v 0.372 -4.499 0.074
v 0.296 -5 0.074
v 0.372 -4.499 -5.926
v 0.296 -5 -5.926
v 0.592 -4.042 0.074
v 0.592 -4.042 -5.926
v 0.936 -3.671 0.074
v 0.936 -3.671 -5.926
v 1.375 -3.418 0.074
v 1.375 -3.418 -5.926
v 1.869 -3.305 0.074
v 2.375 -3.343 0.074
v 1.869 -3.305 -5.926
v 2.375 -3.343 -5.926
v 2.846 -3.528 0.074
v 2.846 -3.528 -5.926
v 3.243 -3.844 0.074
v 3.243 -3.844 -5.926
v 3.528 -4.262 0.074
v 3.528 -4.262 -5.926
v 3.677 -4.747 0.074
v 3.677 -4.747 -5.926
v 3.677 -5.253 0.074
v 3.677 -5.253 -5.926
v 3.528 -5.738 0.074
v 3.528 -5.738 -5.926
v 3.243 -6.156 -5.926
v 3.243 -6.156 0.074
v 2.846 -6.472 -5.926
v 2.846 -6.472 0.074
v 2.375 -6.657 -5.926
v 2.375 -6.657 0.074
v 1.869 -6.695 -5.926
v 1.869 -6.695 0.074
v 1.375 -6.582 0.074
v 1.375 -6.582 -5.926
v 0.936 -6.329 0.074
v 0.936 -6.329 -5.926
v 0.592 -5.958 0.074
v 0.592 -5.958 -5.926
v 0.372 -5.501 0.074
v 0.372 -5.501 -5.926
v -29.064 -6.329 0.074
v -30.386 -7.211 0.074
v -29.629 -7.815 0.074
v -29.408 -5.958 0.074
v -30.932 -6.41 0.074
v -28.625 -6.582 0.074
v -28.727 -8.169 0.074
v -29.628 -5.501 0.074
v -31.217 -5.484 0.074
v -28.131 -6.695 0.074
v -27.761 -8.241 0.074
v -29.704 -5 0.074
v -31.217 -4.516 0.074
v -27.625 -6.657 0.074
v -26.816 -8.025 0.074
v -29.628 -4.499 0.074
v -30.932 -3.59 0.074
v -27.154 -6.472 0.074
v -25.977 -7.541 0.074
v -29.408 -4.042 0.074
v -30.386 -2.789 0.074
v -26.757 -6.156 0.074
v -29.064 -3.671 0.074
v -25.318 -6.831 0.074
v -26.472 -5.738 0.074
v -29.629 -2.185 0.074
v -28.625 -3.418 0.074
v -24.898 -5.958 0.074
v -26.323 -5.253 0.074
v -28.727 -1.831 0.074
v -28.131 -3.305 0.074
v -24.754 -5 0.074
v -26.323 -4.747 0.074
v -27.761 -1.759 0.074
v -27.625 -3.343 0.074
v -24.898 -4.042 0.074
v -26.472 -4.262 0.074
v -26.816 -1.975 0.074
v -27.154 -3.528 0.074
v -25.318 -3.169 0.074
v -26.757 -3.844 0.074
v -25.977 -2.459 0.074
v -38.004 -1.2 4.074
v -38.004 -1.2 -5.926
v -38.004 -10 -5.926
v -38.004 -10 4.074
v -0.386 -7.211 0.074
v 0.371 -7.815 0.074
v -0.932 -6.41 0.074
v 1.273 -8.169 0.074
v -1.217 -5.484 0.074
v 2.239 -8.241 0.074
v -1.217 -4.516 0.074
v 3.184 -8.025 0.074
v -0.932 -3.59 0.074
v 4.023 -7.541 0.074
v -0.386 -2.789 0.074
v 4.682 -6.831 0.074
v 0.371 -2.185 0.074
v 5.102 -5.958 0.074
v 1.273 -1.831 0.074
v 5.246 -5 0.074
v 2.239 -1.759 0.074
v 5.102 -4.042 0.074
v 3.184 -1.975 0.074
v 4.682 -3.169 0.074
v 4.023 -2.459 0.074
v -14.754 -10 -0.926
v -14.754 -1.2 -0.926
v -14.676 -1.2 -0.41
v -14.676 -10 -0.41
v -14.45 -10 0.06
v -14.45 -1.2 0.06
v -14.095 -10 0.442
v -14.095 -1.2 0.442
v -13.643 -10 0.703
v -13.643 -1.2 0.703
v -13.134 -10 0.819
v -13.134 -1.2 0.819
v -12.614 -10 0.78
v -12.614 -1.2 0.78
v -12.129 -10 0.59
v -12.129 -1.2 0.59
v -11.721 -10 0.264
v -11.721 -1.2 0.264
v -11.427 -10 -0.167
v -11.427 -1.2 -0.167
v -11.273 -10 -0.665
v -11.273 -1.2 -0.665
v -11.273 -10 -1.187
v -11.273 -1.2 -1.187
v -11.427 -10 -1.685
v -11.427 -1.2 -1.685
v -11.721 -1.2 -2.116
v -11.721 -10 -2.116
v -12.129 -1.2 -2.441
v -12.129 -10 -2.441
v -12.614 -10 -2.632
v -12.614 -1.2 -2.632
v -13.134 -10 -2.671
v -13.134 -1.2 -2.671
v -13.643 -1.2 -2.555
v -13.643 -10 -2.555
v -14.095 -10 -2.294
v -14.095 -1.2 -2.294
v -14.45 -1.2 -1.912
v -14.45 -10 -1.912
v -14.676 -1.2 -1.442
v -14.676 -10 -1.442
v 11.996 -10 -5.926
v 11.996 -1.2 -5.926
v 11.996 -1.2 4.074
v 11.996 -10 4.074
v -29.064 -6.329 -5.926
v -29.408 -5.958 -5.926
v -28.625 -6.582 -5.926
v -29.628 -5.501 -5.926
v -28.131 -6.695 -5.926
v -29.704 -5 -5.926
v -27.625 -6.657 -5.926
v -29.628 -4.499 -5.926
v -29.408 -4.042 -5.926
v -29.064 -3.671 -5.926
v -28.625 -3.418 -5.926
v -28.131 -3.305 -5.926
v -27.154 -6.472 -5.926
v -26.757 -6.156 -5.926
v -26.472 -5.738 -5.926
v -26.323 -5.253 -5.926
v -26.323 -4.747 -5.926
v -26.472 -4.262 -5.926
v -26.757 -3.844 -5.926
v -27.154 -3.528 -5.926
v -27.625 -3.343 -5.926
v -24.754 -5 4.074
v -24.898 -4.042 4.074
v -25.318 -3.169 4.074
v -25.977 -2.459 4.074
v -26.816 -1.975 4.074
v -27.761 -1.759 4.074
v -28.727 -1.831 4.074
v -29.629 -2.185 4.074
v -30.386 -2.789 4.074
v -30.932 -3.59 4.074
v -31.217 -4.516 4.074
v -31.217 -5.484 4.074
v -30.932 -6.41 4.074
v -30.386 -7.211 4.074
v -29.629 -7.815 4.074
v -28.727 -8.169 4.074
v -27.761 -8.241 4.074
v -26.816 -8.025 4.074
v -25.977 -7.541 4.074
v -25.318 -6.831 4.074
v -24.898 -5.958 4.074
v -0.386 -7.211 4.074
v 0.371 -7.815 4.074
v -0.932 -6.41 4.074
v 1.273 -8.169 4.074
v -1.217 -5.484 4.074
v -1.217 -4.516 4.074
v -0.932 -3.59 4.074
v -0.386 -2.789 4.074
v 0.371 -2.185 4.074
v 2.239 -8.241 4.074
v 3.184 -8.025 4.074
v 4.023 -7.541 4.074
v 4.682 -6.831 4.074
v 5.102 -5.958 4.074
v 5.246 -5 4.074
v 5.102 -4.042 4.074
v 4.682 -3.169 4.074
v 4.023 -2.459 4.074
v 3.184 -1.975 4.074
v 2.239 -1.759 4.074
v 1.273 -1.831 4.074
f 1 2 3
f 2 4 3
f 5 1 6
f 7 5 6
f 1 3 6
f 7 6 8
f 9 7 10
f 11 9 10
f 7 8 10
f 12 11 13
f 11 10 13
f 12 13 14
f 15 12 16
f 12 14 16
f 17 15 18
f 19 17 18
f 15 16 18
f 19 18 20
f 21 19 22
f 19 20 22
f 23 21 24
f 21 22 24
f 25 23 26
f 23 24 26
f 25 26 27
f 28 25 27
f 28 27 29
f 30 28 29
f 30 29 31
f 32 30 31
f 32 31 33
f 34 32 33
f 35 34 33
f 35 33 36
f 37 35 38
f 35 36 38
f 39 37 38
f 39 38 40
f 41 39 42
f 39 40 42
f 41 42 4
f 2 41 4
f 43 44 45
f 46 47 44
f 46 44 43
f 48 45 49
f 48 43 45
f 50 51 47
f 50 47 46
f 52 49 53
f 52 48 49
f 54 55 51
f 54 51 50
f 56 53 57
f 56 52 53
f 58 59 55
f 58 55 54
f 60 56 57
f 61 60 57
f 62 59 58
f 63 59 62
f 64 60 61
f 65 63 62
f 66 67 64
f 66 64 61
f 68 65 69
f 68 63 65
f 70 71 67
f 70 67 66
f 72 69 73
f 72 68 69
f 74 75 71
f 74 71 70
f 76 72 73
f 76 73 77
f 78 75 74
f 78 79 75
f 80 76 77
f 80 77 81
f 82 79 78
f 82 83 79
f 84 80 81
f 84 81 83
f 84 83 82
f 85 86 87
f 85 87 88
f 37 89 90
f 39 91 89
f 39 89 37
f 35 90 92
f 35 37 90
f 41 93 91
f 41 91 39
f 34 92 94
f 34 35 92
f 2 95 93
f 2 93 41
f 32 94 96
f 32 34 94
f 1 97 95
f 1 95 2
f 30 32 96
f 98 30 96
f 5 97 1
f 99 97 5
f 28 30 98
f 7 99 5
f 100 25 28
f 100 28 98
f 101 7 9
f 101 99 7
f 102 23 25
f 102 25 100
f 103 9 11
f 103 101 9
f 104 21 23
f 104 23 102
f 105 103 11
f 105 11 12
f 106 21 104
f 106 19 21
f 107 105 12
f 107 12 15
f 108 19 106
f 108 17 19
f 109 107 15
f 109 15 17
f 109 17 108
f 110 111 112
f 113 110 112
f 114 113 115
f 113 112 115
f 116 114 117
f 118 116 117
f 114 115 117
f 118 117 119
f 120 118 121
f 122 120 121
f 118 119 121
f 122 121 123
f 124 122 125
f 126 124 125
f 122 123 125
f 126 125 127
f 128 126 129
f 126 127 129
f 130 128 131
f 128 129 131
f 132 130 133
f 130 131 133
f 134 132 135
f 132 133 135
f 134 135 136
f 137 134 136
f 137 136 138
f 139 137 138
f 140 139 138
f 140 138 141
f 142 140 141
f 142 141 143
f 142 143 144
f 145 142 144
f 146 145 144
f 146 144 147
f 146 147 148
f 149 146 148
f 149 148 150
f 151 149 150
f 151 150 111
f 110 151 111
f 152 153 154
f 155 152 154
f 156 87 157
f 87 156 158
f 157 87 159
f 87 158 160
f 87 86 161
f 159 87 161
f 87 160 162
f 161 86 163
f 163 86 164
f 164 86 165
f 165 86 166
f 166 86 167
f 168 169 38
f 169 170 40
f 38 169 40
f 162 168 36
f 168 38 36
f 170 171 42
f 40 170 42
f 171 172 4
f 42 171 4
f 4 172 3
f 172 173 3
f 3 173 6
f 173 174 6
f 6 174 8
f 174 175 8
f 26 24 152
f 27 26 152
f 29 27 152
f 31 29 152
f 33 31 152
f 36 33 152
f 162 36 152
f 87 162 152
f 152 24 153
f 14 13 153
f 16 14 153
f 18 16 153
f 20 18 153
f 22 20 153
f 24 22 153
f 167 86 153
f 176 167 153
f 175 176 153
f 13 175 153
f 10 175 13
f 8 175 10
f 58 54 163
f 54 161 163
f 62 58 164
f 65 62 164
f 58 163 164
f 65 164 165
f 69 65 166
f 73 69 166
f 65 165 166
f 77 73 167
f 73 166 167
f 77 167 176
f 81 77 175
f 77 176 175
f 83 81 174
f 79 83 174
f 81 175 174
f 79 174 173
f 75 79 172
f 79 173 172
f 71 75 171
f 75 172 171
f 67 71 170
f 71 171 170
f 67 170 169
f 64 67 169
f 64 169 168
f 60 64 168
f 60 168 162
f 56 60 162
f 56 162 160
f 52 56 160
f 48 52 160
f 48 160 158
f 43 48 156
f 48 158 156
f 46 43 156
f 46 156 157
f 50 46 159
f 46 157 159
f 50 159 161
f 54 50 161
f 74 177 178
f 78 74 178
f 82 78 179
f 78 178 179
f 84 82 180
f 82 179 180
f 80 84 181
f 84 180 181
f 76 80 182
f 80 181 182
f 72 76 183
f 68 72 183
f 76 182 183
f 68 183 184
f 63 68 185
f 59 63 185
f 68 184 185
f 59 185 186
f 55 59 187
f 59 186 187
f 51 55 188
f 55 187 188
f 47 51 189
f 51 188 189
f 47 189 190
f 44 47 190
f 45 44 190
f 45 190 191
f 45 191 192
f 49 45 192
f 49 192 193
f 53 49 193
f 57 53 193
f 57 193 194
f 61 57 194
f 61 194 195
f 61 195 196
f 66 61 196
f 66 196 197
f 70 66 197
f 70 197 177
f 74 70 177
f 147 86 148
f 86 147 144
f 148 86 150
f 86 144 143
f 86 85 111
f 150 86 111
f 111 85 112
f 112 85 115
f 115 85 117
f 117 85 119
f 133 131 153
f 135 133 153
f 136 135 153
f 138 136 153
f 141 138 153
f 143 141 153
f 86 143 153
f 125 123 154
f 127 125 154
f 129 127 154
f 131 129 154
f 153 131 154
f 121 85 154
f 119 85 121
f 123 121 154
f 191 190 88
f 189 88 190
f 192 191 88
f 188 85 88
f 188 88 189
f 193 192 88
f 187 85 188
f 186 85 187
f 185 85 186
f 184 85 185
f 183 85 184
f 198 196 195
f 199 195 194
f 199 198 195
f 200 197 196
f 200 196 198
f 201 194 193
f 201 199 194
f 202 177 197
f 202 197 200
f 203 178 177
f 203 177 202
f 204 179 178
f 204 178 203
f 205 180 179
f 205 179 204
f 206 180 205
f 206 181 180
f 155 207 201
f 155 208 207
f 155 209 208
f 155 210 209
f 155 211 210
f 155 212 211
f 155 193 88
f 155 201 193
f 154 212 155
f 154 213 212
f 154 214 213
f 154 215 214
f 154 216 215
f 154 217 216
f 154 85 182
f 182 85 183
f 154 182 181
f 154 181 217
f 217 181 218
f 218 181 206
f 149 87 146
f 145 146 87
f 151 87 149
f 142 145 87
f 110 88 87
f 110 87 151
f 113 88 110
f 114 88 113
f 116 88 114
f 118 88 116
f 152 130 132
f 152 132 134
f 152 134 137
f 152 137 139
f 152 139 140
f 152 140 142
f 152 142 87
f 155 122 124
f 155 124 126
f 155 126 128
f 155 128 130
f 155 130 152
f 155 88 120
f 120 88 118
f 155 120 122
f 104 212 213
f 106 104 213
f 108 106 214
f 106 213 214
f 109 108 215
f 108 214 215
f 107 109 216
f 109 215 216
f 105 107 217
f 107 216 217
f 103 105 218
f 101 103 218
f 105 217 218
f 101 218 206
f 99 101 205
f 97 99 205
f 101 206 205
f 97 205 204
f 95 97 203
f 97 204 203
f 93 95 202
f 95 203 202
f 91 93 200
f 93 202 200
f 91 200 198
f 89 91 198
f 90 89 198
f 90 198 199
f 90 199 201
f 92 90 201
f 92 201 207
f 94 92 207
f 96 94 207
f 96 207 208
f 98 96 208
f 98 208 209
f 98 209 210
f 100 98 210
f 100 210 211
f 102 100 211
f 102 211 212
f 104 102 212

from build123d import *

# Parameters (mm, degrees)
F0_W           = 50
F0_H           = 10
F1_DEPTH       = 10
F3_D           = 3.4
F3_CBORE_D     = 6.5
F3_CBORE_DEPTH = 4
F5_D           = 3.5
F6_DEPTH       = 1.2


with BuildPart() as f1:
    # F0 (on Front) → F1 (new body)
    with BuildSketch(Plane.XZ):
        with Locations((-13.0036683753, -0.9258947149)):
            Rectangle(F0_W, F0_H)
    extrude(amount=F1_DEPTH)

    # F3 (through all)
    with Locations(Plane.XY.offset(4.0741052851)):
        with Locations((-28.0036683753, -5), (1.9963316247, -5)):
            CounterBoreHole(F3_D / 2, F3_CBORE_D / 2, F3_CBORE_DEPTH)

    # F5 (through all)
    with Locations(Plane.XZ.offset(10)):
        with Locations((-13.0036683753, -0.9258947149)):
            Hole(F5_D / 2)

    # F6 (cut): a face of the model
    f6_faces = [f1.faces().sort_by_distance(p)[0] for p in [
        (-13.0036683753, 0, 3.5642033337),
    ]]
    extrude(f6_faces, amount=-F6_DEPTH, mode=Mode.SUBTRACT)


solid = f1.part
